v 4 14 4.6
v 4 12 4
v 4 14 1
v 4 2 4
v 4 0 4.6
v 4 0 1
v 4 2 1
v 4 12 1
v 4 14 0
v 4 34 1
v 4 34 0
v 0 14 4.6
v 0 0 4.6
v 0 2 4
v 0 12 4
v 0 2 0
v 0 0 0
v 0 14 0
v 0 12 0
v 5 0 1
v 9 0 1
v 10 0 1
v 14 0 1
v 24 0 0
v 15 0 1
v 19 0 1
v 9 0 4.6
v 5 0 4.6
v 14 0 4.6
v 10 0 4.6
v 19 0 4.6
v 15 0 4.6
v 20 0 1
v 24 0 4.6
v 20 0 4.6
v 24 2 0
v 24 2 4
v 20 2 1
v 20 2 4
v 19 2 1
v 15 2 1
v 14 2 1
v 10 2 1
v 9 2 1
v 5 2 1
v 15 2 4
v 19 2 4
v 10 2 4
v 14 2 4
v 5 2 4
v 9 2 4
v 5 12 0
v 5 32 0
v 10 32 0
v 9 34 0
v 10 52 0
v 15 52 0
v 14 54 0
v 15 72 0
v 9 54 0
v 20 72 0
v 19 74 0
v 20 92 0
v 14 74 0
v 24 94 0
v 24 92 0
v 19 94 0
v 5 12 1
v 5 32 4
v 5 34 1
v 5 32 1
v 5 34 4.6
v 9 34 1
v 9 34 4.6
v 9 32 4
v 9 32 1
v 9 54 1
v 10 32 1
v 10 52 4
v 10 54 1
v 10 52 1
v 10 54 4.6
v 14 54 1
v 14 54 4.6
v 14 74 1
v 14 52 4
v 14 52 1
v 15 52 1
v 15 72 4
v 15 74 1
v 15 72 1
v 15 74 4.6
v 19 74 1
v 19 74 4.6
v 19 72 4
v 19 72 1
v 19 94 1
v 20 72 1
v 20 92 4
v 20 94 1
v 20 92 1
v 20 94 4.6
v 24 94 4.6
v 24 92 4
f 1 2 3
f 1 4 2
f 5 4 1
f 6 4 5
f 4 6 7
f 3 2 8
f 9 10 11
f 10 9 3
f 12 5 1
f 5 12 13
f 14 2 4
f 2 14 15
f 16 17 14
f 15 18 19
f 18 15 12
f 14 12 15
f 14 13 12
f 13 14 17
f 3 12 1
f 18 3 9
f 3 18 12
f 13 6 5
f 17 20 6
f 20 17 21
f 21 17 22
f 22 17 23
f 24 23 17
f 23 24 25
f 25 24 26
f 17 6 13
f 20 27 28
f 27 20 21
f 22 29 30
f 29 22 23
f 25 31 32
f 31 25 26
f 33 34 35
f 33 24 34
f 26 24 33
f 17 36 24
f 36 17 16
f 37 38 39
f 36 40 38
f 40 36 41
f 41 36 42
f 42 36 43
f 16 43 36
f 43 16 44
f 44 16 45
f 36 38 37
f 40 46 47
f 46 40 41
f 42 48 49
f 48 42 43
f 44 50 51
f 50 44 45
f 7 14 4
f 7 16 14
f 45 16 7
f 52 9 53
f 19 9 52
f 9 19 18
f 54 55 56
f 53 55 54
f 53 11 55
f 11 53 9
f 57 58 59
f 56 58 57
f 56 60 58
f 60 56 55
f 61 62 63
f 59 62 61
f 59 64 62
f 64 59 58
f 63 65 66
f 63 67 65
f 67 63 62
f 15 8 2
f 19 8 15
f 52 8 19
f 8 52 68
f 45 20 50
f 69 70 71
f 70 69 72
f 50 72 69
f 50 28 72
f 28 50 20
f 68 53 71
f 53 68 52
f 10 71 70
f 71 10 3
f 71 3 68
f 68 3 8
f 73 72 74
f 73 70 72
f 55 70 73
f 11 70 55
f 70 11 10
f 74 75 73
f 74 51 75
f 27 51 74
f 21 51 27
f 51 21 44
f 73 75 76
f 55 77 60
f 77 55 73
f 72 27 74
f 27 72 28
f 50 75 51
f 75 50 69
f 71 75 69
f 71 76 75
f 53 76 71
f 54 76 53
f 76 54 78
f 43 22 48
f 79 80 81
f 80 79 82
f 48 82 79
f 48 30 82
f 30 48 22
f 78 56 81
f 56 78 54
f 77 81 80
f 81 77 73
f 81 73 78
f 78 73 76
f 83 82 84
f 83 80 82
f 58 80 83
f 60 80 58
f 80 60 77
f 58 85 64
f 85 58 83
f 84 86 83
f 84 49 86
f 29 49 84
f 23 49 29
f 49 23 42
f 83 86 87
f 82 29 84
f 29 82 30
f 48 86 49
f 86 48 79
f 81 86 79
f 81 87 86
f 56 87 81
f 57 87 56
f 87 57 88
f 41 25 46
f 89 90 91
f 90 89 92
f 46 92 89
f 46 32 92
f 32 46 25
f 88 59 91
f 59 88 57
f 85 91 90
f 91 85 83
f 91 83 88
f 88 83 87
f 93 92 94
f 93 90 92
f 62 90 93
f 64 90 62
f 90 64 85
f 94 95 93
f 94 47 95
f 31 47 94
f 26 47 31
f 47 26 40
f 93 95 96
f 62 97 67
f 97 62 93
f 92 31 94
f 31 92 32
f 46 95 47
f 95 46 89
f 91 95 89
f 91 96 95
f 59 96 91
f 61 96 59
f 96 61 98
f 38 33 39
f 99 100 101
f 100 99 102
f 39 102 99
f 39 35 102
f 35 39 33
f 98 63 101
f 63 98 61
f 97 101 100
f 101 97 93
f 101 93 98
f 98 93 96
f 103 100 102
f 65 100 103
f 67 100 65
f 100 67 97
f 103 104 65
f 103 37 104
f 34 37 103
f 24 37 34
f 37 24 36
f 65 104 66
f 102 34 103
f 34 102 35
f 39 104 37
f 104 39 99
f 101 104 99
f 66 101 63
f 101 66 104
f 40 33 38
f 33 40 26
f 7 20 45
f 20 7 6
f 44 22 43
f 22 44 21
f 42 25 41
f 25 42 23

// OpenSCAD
for(n=[0:4])
{
  translate([n*5,0,4]) cube([4,14+n*20,0.6]);
  translate([n*5,0,0]) cube([4,2,4]);
  translate([n*5,12+n*20,0]) cube([4,2,4]);
  if(n<4)
  translate([n*5+4,12+n*20,0]) cube([1,22,1]);
}
cube([20,2,1]);
